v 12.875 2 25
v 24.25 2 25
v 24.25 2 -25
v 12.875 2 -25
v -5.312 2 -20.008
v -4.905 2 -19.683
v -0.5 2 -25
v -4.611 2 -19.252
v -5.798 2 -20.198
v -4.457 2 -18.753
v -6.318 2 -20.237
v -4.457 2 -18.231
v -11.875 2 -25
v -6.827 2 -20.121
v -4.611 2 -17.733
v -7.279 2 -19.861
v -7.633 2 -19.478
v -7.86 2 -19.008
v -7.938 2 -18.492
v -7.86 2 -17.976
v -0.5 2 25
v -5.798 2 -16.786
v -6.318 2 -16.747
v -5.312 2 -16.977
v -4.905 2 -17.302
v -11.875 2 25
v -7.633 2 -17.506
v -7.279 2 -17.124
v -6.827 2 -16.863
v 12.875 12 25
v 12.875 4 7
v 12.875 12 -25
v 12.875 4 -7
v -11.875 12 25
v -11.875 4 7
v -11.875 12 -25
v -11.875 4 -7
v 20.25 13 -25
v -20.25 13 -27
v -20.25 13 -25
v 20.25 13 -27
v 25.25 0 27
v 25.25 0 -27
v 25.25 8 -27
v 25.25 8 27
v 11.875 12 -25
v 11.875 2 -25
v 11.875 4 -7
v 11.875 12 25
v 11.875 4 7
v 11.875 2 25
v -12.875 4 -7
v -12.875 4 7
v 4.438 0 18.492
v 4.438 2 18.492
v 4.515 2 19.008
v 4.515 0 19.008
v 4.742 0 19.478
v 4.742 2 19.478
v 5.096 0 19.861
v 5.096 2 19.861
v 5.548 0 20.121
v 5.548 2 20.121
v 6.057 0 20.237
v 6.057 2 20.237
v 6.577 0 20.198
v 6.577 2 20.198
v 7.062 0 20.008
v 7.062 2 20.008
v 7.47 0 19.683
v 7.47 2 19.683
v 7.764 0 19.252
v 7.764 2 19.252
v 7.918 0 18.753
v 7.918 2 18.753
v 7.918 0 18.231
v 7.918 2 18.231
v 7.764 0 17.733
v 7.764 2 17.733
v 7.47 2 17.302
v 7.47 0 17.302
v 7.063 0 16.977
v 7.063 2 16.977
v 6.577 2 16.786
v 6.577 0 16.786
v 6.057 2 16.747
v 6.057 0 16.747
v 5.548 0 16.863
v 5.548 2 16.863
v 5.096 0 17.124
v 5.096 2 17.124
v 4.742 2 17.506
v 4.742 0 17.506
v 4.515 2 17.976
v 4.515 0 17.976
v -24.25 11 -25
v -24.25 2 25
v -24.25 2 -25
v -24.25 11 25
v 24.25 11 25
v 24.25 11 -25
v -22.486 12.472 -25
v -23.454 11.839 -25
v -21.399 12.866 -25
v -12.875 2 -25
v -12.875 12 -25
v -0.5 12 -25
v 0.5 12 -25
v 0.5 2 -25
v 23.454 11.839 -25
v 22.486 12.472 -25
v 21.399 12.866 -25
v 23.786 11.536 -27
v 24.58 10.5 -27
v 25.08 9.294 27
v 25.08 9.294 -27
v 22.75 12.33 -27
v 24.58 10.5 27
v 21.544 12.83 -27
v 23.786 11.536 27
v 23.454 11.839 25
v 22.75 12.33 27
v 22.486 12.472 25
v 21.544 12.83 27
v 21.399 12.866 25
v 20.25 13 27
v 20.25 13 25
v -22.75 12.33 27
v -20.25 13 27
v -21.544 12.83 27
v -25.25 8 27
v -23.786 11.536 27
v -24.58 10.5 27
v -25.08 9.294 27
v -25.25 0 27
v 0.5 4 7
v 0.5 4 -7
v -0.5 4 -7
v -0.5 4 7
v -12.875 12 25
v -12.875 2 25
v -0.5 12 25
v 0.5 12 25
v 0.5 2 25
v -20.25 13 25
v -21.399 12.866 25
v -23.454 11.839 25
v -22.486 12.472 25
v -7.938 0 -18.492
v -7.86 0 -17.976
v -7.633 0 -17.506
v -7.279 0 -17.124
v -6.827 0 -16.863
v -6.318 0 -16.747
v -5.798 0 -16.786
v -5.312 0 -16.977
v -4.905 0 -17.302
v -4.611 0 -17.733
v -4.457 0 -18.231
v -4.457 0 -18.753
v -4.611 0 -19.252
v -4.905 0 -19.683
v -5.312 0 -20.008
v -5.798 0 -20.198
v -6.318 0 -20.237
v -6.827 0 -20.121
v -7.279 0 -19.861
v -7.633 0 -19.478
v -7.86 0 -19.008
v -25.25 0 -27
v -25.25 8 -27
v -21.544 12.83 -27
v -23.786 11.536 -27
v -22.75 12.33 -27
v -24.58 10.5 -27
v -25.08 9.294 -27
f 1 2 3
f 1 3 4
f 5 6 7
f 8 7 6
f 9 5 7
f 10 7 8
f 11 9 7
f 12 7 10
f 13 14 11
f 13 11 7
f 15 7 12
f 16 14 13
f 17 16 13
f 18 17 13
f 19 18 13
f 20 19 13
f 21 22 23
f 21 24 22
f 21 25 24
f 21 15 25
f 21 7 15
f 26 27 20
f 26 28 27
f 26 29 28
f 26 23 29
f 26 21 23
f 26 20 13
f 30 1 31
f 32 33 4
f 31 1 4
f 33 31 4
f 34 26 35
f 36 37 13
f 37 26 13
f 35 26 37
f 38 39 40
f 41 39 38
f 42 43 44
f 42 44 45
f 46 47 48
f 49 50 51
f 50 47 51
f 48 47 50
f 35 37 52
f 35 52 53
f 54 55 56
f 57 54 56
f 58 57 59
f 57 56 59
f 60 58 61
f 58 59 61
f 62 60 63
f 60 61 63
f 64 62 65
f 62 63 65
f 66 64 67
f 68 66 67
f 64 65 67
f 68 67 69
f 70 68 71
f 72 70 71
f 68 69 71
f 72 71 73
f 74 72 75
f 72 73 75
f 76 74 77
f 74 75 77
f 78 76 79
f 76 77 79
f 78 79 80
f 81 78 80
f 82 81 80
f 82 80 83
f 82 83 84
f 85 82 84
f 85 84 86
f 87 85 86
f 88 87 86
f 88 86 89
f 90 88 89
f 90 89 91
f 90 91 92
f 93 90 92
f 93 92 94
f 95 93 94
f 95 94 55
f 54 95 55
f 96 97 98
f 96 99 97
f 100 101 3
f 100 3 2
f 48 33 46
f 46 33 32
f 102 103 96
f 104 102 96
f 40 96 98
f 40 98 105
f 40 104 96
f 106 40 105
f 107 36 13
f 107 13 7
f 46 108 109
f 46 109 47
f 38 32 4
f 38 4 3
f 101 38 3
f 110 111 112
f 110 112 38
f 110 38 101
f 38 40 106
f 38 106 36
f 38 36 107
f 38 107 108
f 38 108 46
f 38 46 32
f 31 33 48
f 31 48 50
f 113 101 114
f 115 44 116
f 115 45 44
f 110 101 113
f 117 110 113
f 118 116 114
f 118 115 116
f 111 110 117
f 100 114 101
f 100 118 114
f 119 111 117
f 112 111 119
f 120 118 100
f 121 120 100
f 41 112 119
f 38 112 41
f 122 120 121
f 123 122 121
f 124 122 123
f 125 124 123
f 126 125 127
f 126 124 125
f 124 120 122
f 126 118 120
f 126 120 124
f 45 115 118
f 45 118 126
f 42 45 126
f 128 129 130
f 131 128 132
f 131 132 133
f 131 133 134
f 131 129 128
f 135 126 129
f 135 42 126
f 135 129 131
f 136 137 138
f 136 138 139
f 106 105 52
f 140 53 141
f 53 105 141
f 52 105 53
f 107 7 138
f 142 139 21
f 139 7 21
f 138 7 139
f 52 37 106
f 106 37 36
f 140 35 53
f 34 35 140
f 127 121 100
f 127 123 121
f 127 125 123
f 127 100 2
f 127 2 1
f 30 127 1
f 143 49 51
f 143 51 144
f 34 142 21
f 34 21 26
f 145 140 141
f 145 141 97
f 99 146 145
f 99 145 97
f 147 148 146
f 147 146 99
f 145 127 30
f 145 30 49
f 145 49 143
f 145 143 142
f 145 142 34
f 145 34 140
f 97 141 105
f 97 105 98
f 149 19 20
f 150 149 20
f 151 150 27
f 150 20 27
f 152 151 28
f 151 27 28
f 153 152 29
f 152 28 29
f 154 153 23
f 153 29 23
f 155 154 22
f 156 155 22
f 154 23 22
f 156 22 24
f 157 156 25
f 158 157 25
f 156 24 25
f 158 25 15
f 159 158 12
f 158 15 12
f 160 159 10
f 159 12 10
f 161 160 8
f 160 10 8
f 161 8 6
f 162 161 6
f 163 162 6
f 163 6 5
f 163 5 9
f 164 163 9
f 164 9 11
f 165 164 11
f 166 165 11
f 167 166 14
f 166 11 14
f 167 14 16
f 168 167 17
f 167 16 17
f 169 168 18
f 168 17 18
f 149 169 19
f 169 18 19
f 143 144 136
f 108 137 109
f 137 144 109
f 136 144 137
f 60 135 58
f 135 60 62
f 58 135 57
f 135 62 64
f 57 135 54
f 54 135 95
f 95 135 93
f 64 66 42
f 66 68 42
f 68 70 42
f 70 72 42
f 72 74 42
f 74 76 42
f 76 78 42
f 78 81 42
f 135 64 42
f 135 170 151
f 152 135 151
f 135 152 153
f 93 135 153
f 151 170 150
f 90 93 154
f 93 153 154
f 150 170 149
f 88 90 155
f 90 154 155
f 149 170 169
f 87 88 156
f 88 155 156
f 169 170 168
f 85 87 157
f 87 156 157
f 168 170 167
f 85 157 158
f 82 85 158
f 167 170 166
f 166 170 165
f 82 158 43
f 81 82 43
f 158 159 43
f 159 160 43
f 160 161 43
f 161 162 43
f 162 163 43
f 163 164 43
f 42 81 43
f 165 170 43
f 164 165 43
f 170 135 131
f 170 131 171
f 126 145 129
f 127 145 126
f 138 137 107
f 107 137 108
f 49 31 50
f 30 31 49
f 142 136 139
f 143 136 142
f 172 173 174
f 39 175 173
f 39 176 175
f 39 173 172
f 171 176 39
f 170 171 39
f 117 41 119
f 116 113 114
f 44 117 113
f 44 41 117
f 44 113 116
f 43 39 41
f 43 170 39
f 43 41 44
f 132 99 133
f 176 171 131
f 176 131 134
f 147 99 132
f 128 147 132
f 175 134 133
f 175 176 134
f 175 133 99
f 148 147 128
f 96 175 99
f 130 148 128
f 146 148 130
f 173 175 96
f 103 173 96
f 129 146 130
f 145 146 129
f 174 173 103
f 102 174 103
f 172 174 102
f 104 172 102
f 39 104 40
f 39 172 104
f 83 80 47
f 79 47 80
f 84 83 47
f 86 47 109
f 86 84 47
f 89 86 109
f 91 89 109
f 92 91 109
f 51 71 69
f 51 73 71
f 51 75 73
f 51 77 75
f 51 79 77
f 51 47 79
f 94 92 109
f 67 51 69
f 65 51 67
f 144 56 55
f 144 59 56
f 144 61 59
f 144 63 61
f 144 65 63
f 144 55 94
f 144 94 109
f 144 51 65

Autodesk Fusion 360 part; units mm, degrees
sketch "スケッチ1" plane through (0, 0, 0) normal (0, 1, 0) x (1, 0, 0)
  line L0 (25.25, -27) -> (-25.25, -27)
  line L1 (-25.25, -27) -> (-25.25, 27)
  line L2 (-25.25, 27) -> (25.25, 27)
  line L3 (25.25, 27) -> (25.25, -27)
  line L4 (25.25, -27) -> (-25.25, 27) construction
  line L5 (-25.25, -27) -> (25.25, 27) construction
  dimension "d1" = 50.5
  dimension "d2" = 54
sketch "スケッチ2" plane through (12.875, 0, 0) normal (1, 0, 0) x (0, 0, -1)
  line L0 (-25, 2) -> (25, 2)
  line L1 (25, 2) -> (25, 12)
  line L2 (25, 12) -> (-25, 12)
  line L3 (-25, 12) -> (-25, 2)
  line L4 (25, 2) -> (7, 2) construction
  line L5 (7, 2) -> (7, 4) construction
  line L6 (7, 4) -> (25, 4) construction
  line L7 (25, 4) -> (25, 2) construction
  line L8 (7, 4) -> (-7, 4)
  line L9 (-7, 4) -> (-7, 12)
  line L10 (-7, 12) -> (7, 12)
  line L11 (7, 12) -> (7, 4)
  dimension "d7" = 18
  dimension "d8" = 2
  dimension "d11" = 14
sketch "スケッチ3" plane through (0, 2, 0) normal (0, 1, 0) x (-1, 0, 0)
  circle A0 centre (-6.1875, 18.4923) radius 1.75
  line L0 (-0.5, -25) -> (-0.5, 25)
  line L1 (-0.5, 25) -> (-11.875, 25)
  line L2 (-11.875, 25) -> (-11.875, -25)
  line L3 (-11.875, -25) -> (-0.5, -25)
  line L4 (-6.1875, 18.4923) -> (6.1875, 18.4923) construction
  line L5 (6.1875, 18.4923) -> (6.1875, -18.4923) construction
  line L6 (6.1875, -18.4923) -> (-6.1875, -18.4923) construction
  line L7 (-6.1875, -18.4923) -> (-6.1875, 18.4923) construction
  circle A1 centre (6.1875, -18.4923) radius 1.75
  dimension "d12" = 12.375
  dimension "d13" = 36.9846
  dimension "d14" = 3.5
sketch "スケッチ4" plane through (0, 2, 0) normal (0, 1, 0) x (-1, 0, 0)
  line L0 (-0.5, -25) -> (-0.5, 25)
  line L1 (-0.5, 25) -> (-11.875, 25)
  line L2 (-11.875, 25) -> (-11.875, -25)
  line L3 (-11.875, -25) -> (-0.5, -25)
  line L4 (-11.875, 25) -> (-6.1875, 25) construction
  line L5 (-6.1875, 25) -> (-6.1875, 18.4923) construction
  line L6 (-6.1875, 18.4923) -> (-11.875, 18.4923) construction
  line L7 (-11.875, 18.4923) -> (-11.875, 25) construction
  circle A0 centre (-6.1875, 18.4923) radius 1.75
  dimension "d17" = 5.6875
  dimension "d18" = 6.5077
  dimension "d19" = 3.5
sketch "スケッチ5" plane through (0, 2, 0) normal (0, 1, 0) x (-1, 0, 0)
  line L0 (0.5, 25) -> (0.5, -25)
  line L1 (0.5, -25) -> (24.25, -25)
  line L2 (24.25, -25) -> (24.25, 25)
  line L3 (24.25, 25) -> (0.5, 25)
  line L4 (0.5, -25) -> (11.875, -25) construction
  line L5 (11.875, -25) -> (11.875, 25) construction
  line L6 (11.875, 25) -> (0.5, 25) construction
  line L7 (0.5, 25) -> (0.5, -25) construction
  line L8 (11.875, -25) -> (12.875, -25)
  line L9 (12.875, -25) -> (12.875, 25)
  line L10 (12.875, 25) -> (11.875, 25)
  line L11 (11.875, 25) -> (11.875, -25)
  dimension "d20" = 50
  dimension "d23" = 11.375
  dimension "d24" = 1
  dimension "d25" = 50
sketch "スケッチ6" plane through (0, 2, 0) normal (0, 1, 0) x (-1, 0, 0)
  line L0 (-11.875, 25) -> (-11.875, -25)
  line L1 (-11.875, -25) -> (24.25, -25)
  line L2 (24.25, -25) -> (24.25, 25)
  line L3 (24.25, 25) -> (-11.875, 25)
  line L4 (-11.875, -25) -> (-0.5, -25) construction
  line L5 (-0.5, -25) -> (-0.5, 25) construction
  line L6 (-0.5, 25) -> (-11.875, 25) construction
  line L7 (-11.875, 25) -> (-11.875, -25) construction
  line L8 (-0.5, -25) -> (0.5, -25)
  line L9 (0.5, -25) -> (0.5, 25)
  line L10 (0.5, 25) -> (-0.5, 25)
  line L11 (-0.5, 25) -> (-0.5, -25)
  dimension "d26" = 11.375
  dimension "d29" = 50
  dimension "d30" = 50
  dimension "d31" = 1
sketch "スケッチ7" plane through (0, 2, 0) normal (0, 1, 0) x (-1, 0, 0)
  line L0 (-24.25, -25) -> (24.25, -25)
  line L1 (24.25, -25) -> (24.25, 25)
  line L2 (24.25, 25) -> (-24.25, 25)
  line L3 (-24.25, 25) -> (-24.25, -25)
  line L4 (-24.25, -25) -> (-12.875, -25) construction
  line L5 (-12.875, -25) -> (-12.875, 25) construction
  line L6 (-12.875, 25) -> (-24.25, 25) construction
  line L7 (-24.25, 25) -> (-24.25, -25) construction
  line L8 (-12.875, -25) -> (-11.875, -25)
  line L9 (-11.875, -25) -> (-11.875, 25)
  line L10 (-11.875, 25) -> (-12.875, 25)
  line L11 (-12.875, 25) -> (-12.875, -25)
  dimension "d38" = 50
  dimension "d39" = 11.375
  dimension "d40" = 50
  dimension "d43" = 1
sketch "スケッチ8" plane through (12.875, 0, 0) normal (1, 0, 0) x (0, 0, -1)
  line L0 (7, 12) -> (7, 4)
  line L1 (7, 4) -> (-7, 4)
  line L2 (-7, 4) -> (-7, 12)
  line L3 (-7, 12) -> (-25, 12)
  line L4 (-25, 12) -> (-25, 2)
  line L5 (-25, 2) -> (25, 2)
  line L6 (25, 2) -> (25, 12)
  line L7 (25, 12) -> (7, 12)
  line L8 (7, 4) -> (25, 12)
  line L9 (25, 12) -> (7, 12)
  line L10 (7, 12) -> (7, 4)
sketch "スケッチ9" plane through (12.875, 0, 0) normal (1, 0, 0) x (0, 0, -1)
  line L0 (25, 12) -> (7, 4)
  line L1 (7, 4) -> (-7, 4)
  line L2 (-7, 4) -> (-7, 12)
  line L3 (-7, 12) -> (-25, 12)
  line L4 (-25, 12) -> (-25, 2)
  line L5 (-25, 2) -> (25, 2)
  line L6 (25, 2) -> (25, 12)
  line L7 (-7, 12) -> (-7, 4)
  line L8 (-7, 12) -> (-25, 12)
  line L9 (-7, 4) -> (-25, 12)
sketch "スケッチ10" plane through (0, 13, 0) normal (0, 1, 0) x (-1, 0, 0)
  line L0 (20.25, -27) -> (20.25, 27)
  line L1 (20.25, 27) -> (-20.25, 27)
  line L2 (-20.25, 27) -> (-20.25, -27)
  line L3 (-20.25, -27) -> (20.25, -27)
  line L4 (-24.25, 25) -> (24.25, 25)
  line L5 (24.25, 25) -> (24.25, -25)
  line L6 (24.25, -25) -> (-24.25, -25)
  line L7 (-24.25, -25) -> (-24.25, 25)
  line L8 (-24.25, 25) -> (24.25, -25) construction
  line L9 (24.25, 25) -> (-24.25, -25) construction
  dimension "d44" = 48.5
  dimension "d45" = 50
extrude "押し出し1" add sketch "スケッチ1" along normal blind 13
fillet "フィレット1" radius 5 1 edges at (25.25, 13, 0)
fillet "フィレット2" radius 5 1 edges at (-25.25, 13, 0)
extrude "押し出し2" cut sketch "スケッチ10" against normal blind 11 contours L0 L2 L4 L6 | L0 L4 L5 L6 | L2 L4 L6 L7
extrude "押し出し3" add sketch "スケッチ7" along normal blind 10 contours L0 L2 L8 L9 L10 L11
extrude "押し出し4" add sketch "スケッチ6" along normal blind 10 contours L1 L3 L8 L9 L10 L11
extrude "押し出し5" add sketch "スケッチ5" along normal blind 10 contours L1 L3 L8 L9 L10 L11
extrude "押し出し6" cut sketch "スケッチ2" against normal blind 28 contours L2 L8 L9 L10 L11
extrude "押し出し7" cut sketch "スケッチ8" against normal blind 27 contours L0 L7 L8 L9 L10
extrude "押し出し8" cut sketch "スケッチ9" against normal blind 28 contours L2 L3 L7 L8 L9
extrude "押し出し9" cut sketch "スケッチ4" against normal blind 12 contours A0
extrude "押し出し10" cut sketch "スケッチ3" against normal blind 2 contours A1
